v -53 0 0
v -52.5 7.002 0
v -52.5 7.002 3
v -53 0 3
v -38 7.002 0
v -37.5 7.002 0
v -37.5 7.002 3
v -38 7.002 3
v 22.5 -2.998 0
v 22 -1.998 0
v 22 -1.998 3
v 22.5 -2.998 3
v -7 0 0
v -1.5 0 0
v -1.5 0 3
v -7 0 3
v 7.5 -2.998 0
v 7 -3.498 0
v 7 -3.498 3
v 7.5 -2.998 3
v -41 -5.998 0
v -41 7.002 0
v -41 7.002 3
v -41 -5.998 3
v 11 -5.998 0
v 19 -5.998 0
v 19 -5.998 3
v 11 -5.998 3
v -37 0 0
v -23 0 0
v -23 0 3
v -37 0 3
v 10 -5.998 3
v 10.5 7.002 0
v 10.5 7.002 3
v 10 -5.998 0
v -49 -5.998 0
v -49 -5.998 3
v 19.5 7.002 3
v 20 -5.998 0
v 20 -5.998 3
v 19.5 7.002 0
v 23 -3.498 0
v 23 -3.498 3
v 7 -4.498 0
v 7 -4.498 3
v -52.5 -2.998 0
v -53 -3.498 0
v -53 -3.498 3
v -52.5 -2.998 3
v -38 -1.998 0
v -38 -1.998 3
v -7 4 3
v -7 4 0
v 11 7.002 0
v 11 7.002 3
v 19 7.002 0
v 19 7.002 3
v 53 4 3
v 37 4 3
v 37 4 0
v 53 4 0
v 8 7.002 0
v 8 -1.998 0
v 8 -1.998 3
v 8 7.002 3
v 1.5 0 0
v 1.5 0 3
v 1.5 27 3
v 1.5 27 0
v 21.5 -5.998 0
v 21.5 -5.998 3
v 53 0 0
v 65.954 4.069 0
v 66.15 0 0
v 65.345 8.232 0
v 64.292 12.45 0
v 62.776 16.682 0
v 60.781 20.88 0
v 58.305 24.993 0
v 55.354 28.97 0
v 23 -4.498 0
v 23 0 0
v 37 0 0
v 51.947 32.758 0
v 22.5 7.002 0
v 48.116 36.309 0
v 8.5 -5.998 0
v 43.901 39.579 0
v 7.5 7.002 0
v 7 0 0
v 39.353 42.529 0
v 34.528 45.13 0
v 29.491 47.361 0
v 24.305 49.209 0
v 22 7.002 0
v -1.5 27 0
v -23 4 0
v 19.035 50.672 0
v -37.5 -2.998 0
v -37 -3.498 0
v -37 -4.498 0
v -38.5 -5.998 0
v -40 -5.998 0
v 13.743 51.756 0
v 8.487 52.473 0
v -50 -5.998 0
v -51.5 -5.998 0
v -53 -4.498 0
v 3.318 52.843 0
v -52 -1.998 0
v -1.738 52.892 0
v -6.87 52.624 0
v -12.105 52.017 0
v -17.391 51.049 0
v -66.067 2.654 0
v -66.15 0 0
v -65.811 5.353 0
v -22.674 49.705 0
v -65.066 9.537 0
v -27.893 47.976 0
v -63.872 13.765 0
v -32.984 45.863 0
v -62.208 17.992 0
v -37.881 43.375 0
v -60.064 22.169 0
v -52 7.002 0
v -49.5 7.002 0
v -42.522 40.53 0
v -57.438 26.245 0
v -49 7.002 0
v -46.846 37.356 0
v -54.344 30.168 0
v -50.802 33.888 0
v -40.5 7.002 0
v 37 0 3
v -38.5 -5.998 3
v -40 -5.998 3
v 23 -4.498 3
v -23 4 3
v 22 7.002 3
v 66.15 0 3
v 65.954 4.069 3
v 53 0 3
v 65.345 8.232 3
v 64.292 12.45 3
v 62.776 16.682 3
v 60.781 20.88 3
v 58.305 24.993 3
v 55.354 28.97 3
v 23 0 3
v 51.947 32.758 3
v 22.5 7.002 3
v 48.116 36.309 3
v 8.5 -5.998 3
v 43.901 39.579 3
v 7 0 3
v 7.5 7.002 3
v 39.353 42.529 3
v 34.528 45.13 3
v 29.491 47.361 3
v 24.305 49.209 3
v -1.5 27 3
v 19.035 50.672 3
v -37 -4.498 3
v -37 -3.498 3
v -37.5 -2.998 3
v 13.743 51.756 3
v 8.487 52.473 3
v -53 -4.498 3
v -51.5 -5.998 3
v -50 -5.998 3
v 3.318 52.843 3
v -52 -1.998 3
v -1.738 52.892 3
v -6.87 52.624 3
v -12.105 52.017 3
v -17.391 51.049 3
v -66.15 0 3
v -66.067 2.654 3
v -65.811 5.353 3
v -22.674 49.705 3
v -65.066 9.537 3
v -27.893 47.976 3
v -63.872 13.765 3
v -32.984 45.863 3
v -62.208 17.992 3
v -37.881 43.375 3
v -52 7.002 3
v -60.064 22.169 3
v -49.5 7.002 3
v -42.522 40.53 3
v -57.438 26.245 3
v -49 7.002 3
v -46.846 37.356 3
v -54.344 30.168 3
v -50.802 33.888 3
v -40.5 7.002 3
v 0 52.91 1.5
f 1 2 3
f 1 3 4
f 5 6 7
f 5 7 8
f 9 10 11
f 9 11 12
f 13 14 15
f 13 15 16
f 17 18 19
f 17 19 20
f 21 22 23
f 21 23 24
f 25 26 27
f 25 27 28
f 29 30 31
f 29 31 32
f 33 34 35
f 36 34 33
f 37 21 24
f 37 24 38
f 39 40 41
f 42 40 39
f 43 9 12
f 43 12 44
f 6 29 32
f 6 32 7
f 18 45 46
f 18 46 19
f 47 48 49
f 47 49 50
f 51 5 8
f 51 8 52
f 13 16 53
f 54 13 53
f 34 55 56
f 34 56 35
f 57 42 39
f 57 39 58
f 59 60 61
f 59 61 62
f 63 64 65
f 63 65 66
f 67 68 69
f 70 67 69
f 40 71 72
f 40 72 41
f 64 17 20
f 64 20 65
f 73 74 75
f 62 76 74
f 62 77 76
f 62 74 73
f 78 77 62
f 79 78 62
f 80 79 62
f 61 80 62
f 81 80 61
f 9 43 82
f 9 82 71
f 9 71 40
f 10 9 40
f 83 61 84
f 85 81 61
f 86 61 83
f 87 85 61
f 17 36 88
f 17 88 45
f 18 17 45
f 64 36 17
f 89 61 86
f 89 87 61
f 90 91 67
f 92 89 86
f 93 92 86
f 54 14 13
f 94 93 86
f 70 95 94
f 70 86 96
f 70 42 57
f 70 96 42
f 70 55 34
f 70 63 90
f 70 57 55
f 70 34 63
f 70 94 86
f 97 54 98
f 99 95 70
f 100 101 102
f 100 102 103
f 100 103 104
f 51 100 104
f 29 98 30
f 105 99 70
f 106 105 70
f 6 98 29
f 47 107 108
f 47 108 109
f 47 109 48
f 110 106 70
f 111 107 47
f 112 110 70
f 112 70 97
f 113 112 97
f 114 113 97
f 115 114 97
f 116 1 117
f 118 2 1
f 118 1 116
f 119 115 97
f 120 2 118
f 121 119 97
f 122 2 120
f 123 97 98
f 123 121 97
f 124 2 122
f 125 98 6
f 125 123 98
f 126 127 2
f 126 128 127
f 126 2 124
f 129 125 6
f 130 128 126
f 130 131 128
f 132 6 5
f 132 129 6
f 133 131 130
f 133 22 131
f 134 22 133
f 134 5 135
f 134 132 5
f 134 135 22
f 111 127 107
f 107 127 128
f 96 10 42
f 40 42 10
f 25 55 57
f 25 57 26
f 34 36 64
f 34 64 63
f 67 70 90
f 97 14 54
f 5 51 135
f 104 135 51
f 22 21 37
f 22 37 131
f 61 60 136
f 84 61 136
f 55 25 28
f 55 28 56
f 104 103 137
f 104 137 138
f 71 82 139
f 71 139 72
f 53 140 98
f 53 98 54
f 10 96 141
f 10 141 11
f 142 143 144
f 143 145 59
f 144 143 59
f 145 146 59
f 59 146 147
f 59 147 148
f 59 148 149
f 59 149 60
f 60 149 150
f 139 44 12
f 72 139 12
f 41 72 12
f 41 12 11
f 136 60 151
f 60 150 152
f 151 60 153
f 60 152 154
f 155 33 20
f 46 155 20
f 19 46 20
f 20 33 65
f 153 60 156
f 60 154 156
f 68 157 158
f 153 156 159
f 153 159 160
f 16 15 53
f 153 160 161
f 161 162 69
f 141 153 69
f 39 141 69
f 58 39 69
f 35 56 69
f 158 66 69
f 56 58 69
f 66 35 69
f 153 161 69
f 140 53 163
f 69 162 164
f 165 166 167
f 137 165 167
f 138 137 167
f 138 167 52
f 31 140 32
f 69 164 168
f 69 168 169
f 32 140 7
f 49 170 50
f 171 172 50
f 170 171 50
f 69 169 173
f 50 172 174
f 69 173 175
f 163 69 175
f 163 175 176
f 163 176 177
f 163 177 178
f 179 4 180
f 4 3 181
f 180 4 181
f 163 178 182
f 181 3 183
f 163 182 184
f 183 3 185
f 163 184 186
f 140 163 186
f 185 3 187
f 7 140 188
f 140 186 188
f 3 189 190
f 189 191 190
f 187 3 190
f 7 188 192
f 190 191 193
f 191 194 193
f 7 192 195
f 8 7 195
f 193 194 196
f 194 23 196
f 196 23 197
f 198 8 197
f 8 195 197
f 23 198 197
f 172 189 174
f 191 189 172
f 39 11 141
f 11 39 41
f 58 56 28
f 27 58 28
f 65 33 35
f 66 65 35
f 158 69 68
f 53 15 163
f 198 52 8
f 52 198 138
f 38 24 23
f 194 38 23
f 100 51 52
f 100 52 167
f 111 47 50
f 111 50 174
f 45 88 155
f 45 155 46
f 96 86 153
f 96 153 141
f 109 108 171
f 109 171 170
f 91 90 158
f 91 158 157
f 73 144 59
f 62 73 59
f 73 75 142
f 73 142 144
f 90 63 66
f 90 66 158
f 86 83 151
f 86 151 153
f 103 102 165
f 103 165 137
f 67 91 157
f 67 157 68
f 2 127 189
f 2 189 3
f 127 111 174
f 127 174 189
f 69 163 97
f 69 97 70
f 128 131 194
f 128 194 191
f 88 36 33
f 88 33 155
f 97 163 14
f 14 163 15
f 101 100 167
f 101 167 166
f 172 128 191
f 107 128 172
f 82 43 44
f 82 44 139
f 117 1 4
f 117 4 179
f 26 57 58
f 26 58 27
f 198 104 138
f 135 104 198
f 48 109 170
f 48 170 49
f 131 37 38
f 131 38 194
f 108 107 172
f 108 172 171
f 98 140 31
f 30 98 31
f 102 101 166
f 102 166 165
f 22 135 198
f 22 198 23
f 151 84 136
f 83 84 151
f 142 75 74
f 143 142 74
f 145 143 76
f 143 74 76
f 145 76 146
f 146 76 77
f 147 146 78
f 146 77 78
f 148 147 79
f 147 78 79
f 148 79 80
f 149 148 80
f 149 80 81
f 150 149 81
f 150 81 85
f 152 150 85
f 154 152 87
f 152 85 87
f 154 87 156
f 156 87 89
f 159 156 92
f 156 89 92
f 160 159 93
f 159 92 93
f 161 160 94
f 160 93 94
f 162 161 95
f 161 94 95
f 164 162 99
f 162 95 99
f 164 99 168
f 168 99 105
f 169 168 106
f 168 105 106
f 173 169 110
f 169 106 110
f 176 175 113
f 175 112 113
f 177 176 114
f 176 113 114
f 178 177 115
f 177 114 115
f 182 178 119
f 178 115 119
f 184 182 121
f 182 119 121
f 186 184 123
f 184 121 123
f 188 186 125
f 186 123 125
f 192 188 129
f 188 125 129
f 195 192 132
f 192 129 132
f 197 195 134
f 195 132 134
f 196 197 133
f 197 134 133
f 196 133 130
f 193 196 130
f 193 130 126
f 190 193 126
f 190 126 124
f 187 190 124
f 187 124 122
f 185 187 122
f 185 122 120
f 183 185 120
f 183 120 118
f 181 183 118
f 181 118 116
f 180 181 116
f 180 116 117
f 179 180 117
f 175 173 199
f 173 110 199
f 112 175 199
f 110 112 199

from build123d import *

# Parameters (mm, degrees)
BOSS_EXTRUDE1_DEPTH     = 3
CUT_EXTRUDE1_DEPTH      = 85.760194811
CUT_EXTRUDE1_DEPTH_BACK = 3
CUT_EXTRUDE2_DEPTH      = 85.760194811
CUT_EXTRUDE2_DEPTH_BACK = 3
CUT_EXTRUDE3_DEPTH      = 85.760194811
CUT_EXTRUDE3_DEPTH_BACK = 3


with BuildPart() as part:
    # Sketch1 → Boss-Extrude1 (new body)
    with BuildSketch(Plane.XY):
        with BuildLine():
            Line((-53, 0), (-66.15, 0))
            add(Edge.make_bspline(
                [(0, 52.91), (-66.15, 52.91), (-66.15, 0)],
                knots=[1.570796327, 1.570796327, 1.570796327, 3.141592654, 3.141592654, 3.141592654], degree=2, weights=[1, 0.707106781, 1]))
            add(Edge.make_bspline(
                [(66.15, 0), (66.15, 52.91), (0, 52.91)],
                knots=[3.141592654, 3.141592654, 3.141592654, 4.71238898, 4.71238898, 4.71238898], degree=2, weights=[1, 0.707106781, 1]))
            Line((66.15, 0), (23, 0))
            Line((23, 0), (22.5, 7.002171092))
            Line((22.5, 7.002171092), (22, 7.002171092))
            Line((22, 7.002171092), (22, -1.997828908))
            Line((22, -1.997828908), (22.5, -2.997828908))
            Line((22.5, -2.997828908), (23, -3.497828908))
            Line((23, -3.497828908), (23, -4.497828908))
            Line((23, -4.497828908), (21.5, -5.997828908))
            Line((21.5, -5.997828908), (20, -5.997828908))
            Line((20, -5.997828908), (19.5, 7.002171092))
            Line((19.5, 7.002171092), (19, 7.002171092))
            Line((19, 7.002171092), (19, -5.997828908))
            Line((19, -5.997828908), (11, -5.997828908))
            Line((11, -5.997828908), (11, 7.002171092))
            Line((11, 7.002171092), (10.5, 7.002171092))
            Line((10.5, 7.002171092), (10, -5.997828908))
            Line((10, -5.997828908), (8.5, -5.997828908))
            Line((8.5, -5.997828908), (7, -4.497828908))
            Line((7, -4.497828908), (7, -3.497828908))
            Line((7, -3.497828908), (7.5, -2.997828908))
            Line((7.5, -2.997828908), (8, -1.997828908))
            Line((8, -1.997828908), (8, 7.002171092))
            Line((8, 7.002171092), (7.5, 7.002171092))
            Line((7.5, 7.002171092), (7, 0))
            Line((7, 0), (-37, 0))
            Line((-37, 0), (-37.5, 7.002171092))
            Line((-37.5, 7.002171092), (-38, 7.002171092))
            Line((-38, 7.002171092), (-38, -1.997828908))
            Line((-38, -1.997828908), (-37.5, -2.997828908))
            Line((-37.5, -2.997828908), (-37, -3.497828908))
            Line((-37, -3.497828908), (-37, -4.497828908))
            Line((-37, -4.497828908), (-38.5, -5.997828908))
            Line((-38.5, -5.997828908), (-40, -5.997828908))
            Line((-40, -5.997828908), (-40.5, 7.002171092))
            Line((-40.5, 7.002171092), (-41, 7.002171092))
            Line((-41, 7.002171092), (-41, -5.997828908))
            Line((-41, -5.997828908), (-49, -5.997828908))
            Line((-49, -5.997828908), (-49, 7.002171092))
            Line((-49, 7.002171092), (-49.5, 7.002171092))
            Line((-49.5, 7.002171092), (-50, -5.997828908))
            Line((-50, -5.997828908), (-51.5, -5.997828908))
            Line((-51.5, -5.997828908), (-53, -4.497828908))
            Line((-53, -4.497828908), (-53, -3.497828908))
            Line((-53, -3.497828908), (-52.5, -2.997828908))
            Line((-52.5, -2.997828908), (-52, -1.997828908))
            Line((-52, -1.997828908), (-52, 7.002171092))
            Line((-52, 7.002171092), (-52.5, 7.002171092))
            Line((-52.5, 7.002171092), (-53, 0))
        make_face()
    extrude(amount=BOSS_EXTRUDE1_DEPTH)

    # Sketch2 → Cut-Extrude1 (cut, two sides)
    with BuildSketch(Plane.XY.offset(3)) as cut_extrude1_sk:
        Polygon((-1.5, -181.767175259), (-1.5, 0), (-1.5, 27), (1.5, 27), (1.5, 0), (1.5, -181.767175259), (1.5, -545.301525777), (-1.5, -545.301525777), align=None)
    extrude(amount=CUT_EXTRUDE1_DEPTH, mode=Mode.SUBTRACT)
    extrude(cut_extrude1_sk.sketch, amount=-CUT_EXTRUDE1_DEPTH_BACK, mode=Mode.SUBTRACT)

    # Sketch3 → Cut-Extrude2 (cut, two sides)
    with BuildSketch(Plane.XY.offset(3)) as cut_extrude2_sk:
        Polygon((-23, -217.337315777), (-23, 0), (-23, 4), (-7, 4), (-7, 0), (-7, -217.337315777), (-7, -652.011947331), (-23, -652.011947331), align=None)
    extrude(amount=CUT_EXTRUDE2_DEPTH, mode=Mode.SUBTRACT)
    extrude(cut_extrude2_sk.sketch, amount=-CUT_EXTRUDE2_DEPTH_BACK, mode=Mode.SUBTRACT)

    # Sketch4 → Cut-Extrude3 (cut, two sides)
    with BuildSketch(Plane.XY.offset(3)) as cut_extrude3_sk:
        Polygon((37, -270.738878071), (37, 0), (37, 4), (53, 4), (53, 0), (53, -270.738878071), (53, -812.216634213), (37, -812.216634213), align=None)
    extrude(amount=CUT_EXTRUDE3_DEPTH, mode=Mode.SUBTRACT)
    extrude(cut_extrude3_sk.sketch, amount=-CUT_EXTRUDE3_DEPTH_BACK, mode=Mode.SUBTRACT)


solid = part.part
